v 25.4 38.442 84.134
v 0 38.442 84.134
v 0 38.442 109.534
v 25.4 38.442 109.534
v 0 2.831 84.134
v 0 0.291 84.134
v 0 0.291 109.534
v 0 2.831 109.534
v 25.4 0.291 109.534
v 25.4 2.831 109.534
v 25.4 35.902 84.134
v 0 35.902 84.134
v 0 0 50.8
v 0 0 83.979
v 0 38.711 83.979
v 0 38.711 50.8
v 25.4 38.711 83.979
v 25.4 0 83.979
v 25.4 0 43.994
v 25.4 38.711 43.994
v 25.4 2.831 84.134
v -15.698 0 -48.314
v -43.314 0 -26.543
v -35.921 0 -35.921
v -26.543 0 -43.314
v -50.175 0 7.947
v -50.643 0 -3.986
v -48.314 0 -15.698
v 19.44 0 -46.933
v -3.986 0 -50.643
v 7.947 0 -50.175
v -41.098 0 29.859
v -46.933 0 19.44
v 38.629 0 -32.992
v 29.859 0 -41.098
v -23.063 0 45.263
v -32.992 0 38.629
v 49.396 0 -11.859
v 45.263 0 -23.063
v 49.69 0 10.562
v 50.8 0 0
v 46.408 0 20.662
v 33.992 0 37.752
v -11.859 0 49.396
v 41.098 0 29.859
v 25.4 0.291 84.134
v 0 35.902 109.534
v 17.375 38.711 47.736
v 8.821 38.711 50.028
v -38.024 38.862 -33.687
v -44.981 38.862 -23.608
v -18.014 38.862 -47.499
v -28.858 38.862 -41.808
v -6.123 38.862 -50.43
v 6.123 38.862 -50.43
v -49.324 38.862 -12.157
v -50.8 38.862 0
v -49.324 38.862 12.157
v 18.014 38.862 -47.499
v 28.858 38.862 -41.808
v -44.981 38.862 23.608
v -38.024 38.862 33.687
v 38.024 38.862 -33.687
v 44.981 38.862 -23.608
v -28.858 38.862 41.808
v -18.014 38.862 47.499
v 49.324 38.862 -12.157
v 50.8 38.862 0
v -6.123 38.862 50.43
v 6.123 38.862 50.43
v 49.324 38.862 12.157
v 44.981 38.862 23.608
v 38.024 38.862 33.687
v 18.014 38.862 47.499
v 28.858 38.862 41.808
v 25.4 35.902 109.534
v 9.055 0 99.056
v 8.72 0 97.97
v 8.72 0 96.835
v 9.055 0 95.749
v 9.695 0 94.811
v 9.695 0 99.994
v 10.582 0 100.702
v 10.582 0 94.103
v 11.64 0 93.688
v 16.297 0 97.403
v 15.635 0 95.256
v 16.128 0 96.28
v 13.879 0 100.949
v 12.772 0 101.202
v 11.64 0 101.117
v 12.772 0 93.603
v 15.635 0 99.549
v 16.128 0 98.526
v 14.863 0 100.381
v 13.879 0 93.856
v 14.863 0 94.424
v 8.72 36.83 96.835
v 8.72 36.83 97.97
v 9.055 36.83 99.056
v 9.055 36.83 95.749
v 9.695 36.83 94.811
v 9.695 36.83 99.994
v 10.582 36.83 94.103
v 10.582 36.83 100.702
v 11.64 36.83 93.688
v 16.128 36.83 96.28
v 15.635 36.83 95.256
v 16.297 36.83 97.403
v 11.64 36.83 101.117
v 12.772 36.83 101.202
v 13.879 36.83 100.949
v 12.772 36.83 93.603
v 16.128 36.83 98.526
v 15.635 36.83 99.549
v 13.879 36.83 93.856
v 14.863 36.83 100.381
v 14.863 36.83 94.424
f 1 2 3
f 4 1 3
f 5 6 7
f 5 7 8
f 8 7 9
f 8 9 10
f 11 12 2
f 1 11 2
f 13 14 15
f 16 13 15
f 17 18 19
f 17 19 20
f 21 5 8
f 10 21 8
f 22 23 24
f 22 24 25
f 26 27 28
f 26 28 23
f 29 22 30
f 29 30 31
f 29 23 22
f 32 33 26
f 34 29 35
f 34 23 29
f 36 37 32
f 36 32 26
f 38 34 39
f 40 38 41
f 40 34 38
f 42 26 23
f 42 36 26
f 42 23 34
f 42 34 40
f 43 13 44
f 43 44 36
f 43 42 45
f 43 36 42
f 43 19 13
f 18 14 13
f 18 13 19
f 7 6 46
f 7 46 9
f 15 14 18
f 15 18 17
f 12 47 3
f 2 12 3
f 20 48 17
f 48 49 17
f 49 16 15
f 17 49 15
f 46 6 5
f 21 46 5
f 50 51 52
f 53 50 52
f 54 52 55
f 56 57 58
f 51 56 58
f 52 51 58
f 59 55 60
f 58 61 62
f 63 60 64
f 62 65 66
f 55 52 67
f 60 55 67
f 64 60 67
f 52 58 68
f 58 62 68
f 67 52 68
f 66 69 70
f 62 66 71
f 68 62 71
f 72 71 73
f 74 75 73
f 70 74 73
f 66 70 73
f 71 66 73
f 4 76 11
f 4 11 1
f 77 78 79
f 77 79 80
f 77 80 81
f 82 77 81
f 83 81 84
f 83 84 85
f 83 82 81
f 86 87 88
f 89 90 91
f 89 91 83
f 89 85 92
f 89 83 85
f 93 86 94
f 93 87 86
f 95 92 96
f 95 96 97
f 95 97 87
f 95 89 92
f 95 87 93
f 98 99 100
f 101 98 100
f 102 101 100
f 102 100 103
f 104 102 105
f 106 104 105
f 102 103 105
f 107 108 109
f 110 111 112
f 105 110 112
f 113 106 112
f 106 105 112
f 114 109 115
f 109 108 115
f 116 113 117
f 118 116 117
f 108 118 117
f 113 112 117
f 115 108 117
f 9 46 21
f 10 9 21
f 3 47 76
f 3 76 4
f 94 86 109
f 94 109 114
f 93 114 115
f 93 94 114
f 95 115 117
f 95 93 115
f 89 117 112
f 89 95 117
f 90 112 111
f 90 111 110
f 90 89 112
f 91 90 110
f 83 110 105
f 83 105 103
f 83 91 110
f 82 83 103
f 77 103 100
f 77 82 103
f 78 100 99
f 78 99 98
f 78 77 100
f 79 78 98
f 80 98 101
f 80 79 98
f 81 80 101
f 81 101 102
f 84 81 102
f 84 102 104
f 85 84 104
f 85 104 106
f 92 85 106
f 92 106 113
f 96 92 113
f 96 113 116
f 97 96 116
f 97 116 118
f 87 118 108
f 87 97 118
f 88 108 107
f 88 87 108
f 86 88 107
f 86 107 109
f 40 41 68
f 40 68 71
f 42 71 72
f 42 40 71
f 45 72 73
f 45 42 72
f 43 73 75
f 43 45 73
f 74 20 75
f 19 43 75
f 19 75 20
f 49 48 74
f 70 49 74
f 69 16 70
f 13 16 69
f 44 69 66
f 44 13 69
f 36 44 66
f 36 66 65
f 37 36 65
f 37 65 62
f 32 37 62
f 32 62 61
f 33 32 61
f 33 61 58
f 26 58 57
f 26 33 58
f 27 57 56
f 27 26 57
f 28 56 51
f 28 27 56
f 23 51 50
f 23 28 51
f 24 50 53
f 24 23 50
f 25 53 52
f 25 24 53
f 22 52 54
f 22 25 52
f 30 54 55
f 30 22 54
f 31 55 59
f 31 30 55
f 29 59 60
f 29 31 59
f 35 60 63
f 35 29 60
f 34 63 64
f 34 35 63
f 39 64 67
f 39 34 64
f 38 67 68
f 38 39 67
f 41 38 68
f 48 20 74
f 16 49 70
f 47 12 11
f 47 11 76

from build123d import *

# Parameters (mm, degrees)
F0_R     = 50.8
F1_DEPTH = 38.862
F2_W     = 38.7112945318
F2_H     = 79.9200646579
F4_DEPTH = 25.4
F5_W     = 2.54
F5_H     = 25.4
F6_DEPTH = 25.4
F7_R     = 3.81
F8_DEPTH = 36.83


# Not quite as in the source:
# - the program builds the solid bodies; features that only make, move or delete a surface that nothing else refers to are left out


with BuildPart() as f1:
    # F0 (on Front) → F1 (new body)
    with BuildSketch(Plane.XZ):
        Circle(F0_R)
    extrude(amount=-F1_DEPTH)

    # F2 (on Right) → F4 (join)
    with BuildSketch(Plane.YZ):
        with Locations((19.3556472659, 44.0184753388)):
            Rectangle(F2_W, F2_H)
    extrude(amount=F4_DEPTH)


with BuildPart() as f6:
    # F5 (on Right) → F6 (new body)
    with BuildSketch(Plane.YZ):
        with Locations((1.5609483235, 96.833985544)):
            Rectangle(F5_W, F5_H)
    extrude(amount=F6_DEPTH)


with BuildPart() as f6b:
    # F5 (on Right) → F6, piece 2 (new body)
    with BuildSketch(Plane.YZ):
        with Locations((37.1715911818, 96.833985544)):
            Rectangle(F5_W, F5_H)
    extrude(amount=F6_DEPTH)


with BuildPart() as f8:
    # F7 (on Front) → F8 (new body)
    with BuildSketch(Plane.XZ):
        with Locations((12.4874990433, 97.4025800824)):
            Circle(F7_R)
    extrude(amount=-F8_DEPTH)


solid = Compound([f1.part, f6.part, f6b.part, f8.part])
